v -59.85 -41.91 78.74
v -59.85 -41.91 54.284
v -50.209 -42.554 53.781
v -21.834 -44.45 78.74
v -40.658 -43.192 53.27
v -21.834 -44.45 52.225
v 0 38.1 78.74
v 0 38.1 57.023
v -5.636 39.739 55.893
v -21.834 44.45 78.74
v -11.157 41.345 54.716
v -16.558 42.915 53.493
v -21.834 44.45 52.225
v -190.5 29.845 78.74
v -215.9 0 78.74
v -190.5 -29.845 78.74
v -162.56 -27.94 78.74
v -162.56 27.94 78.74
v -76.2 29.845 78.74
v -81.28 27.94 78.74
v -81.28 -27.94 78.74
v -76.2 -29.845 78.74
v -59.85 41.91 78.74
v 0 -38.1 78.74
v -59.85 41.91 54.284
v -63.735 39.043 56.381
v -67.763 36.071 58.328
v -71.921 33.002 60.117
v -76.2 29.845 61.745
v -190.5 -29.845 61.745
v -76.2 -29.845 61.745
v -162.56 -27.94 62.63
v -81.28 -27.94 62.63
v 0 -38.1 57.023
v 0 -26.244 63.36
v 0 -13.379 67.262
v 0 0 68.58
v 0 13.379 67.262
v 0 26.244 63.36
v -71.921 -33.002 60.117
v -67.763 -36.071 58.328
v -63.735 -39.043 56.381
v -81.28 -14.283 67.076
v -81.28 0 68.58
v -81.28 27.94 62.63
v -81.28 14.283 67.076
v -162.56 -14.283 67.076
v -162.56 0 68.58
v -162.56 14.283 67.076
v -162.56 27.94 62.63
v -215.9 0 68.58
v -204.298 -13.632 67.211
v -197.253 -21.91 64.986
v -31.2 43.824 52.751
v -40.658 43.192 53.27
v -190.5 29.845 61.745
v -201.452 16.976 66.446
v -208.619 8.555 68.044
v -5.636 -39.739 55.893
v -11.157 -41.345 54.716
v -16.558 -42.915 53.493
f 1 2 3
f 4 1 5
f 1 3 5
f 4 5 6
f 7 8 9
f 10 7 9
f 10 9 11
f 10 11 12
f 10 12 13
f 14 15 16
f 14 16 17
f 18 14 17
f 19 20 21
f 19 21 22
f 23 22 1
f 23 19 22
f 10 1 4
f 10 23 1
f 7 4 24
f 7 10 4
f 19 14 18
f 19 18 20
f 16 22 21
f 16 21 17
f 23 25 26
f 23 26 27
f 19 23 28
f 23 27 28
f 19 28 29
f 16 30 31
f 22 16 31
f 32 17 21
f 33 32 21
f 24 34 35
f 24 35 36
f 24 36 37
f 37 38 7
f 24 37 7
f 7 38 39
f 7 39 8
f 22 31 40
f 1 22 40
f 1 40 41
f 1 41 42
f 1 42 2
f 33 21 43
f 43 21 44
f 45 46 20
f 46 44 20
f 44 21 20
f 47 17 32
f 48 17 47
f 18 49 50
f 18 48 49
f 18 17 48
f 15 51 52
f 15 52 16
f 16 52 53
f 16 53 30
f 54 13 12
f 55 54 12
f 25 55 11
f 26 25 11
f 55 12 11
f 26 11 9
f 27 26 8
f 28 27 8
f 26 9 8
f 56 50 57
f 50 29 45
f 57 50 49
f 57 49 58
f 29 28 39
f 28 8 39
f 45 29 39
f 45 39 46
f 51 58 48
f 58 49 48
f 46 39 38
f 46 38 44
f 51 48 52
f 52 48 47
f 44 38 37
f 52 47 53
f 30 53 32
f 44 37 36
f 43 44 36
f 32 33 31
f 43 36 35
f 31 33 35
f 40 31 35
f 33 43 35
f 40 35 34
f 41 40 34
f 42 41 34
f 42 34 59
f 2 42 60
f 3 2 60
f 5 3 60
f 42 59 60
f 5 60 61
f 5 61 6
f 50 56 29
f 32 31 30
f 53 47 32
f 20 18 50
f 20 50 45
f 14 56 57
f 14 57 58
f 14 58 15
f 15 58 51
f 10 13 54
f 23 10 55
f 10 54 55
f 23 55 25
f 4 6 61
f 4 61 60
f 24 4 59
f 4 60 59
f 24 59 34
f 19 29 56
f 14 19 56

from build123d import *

# Parameters (mm, degrees)
F1_DEPTH = 78.74
F2_R     = 68.58
F3_DEPTH = 228.6
F4_W     = 81.28
F4_H     = 55.88
F5_DEPTH = 25.4


with BuildPart() as f1:
    # F0 (on Top) → F1 (new body)
    with BuildSketch(Plane.XY):
        Polygon((0, 0), (0, 38.1), (-21.834282, 44.45), (-59.849521, 41.91), (-76.2, 29.845), (-76.2, 0), align=None)
        Polygon((0, -38.1), (0, 0), (-76.2, 0), (-76.2, -29.845), (-59.849521, -41.91), (-21.834282, -44.45), align=None)
        Polygon((-76.2, -29.845), (-76.2, 0), (-76.2, 29.845), (-190.5, 29.845), (-215.9, 0), (-190.5, -29.845), align=None)
    extrude(amount=F1_DEPTH)

    # F2 (on face) → F3 (cut)
    with BuildSketch(Plane.YZ):
        Circle(F2_R)
    extrude(amount=-F3_DEPTH, mode=Mode.SUBTRACT)

    # F4 (on face) → F5 (cut)
    with BuildSketch(Plane.XY.offset(78.74)):
        with Locations((-121.92, 0)):
            Rectangle(F4_W, F4_H)
    extrude(amount=-F5_DEPTH, mode=Mode.SUBTRACT)


solid = f1.part
